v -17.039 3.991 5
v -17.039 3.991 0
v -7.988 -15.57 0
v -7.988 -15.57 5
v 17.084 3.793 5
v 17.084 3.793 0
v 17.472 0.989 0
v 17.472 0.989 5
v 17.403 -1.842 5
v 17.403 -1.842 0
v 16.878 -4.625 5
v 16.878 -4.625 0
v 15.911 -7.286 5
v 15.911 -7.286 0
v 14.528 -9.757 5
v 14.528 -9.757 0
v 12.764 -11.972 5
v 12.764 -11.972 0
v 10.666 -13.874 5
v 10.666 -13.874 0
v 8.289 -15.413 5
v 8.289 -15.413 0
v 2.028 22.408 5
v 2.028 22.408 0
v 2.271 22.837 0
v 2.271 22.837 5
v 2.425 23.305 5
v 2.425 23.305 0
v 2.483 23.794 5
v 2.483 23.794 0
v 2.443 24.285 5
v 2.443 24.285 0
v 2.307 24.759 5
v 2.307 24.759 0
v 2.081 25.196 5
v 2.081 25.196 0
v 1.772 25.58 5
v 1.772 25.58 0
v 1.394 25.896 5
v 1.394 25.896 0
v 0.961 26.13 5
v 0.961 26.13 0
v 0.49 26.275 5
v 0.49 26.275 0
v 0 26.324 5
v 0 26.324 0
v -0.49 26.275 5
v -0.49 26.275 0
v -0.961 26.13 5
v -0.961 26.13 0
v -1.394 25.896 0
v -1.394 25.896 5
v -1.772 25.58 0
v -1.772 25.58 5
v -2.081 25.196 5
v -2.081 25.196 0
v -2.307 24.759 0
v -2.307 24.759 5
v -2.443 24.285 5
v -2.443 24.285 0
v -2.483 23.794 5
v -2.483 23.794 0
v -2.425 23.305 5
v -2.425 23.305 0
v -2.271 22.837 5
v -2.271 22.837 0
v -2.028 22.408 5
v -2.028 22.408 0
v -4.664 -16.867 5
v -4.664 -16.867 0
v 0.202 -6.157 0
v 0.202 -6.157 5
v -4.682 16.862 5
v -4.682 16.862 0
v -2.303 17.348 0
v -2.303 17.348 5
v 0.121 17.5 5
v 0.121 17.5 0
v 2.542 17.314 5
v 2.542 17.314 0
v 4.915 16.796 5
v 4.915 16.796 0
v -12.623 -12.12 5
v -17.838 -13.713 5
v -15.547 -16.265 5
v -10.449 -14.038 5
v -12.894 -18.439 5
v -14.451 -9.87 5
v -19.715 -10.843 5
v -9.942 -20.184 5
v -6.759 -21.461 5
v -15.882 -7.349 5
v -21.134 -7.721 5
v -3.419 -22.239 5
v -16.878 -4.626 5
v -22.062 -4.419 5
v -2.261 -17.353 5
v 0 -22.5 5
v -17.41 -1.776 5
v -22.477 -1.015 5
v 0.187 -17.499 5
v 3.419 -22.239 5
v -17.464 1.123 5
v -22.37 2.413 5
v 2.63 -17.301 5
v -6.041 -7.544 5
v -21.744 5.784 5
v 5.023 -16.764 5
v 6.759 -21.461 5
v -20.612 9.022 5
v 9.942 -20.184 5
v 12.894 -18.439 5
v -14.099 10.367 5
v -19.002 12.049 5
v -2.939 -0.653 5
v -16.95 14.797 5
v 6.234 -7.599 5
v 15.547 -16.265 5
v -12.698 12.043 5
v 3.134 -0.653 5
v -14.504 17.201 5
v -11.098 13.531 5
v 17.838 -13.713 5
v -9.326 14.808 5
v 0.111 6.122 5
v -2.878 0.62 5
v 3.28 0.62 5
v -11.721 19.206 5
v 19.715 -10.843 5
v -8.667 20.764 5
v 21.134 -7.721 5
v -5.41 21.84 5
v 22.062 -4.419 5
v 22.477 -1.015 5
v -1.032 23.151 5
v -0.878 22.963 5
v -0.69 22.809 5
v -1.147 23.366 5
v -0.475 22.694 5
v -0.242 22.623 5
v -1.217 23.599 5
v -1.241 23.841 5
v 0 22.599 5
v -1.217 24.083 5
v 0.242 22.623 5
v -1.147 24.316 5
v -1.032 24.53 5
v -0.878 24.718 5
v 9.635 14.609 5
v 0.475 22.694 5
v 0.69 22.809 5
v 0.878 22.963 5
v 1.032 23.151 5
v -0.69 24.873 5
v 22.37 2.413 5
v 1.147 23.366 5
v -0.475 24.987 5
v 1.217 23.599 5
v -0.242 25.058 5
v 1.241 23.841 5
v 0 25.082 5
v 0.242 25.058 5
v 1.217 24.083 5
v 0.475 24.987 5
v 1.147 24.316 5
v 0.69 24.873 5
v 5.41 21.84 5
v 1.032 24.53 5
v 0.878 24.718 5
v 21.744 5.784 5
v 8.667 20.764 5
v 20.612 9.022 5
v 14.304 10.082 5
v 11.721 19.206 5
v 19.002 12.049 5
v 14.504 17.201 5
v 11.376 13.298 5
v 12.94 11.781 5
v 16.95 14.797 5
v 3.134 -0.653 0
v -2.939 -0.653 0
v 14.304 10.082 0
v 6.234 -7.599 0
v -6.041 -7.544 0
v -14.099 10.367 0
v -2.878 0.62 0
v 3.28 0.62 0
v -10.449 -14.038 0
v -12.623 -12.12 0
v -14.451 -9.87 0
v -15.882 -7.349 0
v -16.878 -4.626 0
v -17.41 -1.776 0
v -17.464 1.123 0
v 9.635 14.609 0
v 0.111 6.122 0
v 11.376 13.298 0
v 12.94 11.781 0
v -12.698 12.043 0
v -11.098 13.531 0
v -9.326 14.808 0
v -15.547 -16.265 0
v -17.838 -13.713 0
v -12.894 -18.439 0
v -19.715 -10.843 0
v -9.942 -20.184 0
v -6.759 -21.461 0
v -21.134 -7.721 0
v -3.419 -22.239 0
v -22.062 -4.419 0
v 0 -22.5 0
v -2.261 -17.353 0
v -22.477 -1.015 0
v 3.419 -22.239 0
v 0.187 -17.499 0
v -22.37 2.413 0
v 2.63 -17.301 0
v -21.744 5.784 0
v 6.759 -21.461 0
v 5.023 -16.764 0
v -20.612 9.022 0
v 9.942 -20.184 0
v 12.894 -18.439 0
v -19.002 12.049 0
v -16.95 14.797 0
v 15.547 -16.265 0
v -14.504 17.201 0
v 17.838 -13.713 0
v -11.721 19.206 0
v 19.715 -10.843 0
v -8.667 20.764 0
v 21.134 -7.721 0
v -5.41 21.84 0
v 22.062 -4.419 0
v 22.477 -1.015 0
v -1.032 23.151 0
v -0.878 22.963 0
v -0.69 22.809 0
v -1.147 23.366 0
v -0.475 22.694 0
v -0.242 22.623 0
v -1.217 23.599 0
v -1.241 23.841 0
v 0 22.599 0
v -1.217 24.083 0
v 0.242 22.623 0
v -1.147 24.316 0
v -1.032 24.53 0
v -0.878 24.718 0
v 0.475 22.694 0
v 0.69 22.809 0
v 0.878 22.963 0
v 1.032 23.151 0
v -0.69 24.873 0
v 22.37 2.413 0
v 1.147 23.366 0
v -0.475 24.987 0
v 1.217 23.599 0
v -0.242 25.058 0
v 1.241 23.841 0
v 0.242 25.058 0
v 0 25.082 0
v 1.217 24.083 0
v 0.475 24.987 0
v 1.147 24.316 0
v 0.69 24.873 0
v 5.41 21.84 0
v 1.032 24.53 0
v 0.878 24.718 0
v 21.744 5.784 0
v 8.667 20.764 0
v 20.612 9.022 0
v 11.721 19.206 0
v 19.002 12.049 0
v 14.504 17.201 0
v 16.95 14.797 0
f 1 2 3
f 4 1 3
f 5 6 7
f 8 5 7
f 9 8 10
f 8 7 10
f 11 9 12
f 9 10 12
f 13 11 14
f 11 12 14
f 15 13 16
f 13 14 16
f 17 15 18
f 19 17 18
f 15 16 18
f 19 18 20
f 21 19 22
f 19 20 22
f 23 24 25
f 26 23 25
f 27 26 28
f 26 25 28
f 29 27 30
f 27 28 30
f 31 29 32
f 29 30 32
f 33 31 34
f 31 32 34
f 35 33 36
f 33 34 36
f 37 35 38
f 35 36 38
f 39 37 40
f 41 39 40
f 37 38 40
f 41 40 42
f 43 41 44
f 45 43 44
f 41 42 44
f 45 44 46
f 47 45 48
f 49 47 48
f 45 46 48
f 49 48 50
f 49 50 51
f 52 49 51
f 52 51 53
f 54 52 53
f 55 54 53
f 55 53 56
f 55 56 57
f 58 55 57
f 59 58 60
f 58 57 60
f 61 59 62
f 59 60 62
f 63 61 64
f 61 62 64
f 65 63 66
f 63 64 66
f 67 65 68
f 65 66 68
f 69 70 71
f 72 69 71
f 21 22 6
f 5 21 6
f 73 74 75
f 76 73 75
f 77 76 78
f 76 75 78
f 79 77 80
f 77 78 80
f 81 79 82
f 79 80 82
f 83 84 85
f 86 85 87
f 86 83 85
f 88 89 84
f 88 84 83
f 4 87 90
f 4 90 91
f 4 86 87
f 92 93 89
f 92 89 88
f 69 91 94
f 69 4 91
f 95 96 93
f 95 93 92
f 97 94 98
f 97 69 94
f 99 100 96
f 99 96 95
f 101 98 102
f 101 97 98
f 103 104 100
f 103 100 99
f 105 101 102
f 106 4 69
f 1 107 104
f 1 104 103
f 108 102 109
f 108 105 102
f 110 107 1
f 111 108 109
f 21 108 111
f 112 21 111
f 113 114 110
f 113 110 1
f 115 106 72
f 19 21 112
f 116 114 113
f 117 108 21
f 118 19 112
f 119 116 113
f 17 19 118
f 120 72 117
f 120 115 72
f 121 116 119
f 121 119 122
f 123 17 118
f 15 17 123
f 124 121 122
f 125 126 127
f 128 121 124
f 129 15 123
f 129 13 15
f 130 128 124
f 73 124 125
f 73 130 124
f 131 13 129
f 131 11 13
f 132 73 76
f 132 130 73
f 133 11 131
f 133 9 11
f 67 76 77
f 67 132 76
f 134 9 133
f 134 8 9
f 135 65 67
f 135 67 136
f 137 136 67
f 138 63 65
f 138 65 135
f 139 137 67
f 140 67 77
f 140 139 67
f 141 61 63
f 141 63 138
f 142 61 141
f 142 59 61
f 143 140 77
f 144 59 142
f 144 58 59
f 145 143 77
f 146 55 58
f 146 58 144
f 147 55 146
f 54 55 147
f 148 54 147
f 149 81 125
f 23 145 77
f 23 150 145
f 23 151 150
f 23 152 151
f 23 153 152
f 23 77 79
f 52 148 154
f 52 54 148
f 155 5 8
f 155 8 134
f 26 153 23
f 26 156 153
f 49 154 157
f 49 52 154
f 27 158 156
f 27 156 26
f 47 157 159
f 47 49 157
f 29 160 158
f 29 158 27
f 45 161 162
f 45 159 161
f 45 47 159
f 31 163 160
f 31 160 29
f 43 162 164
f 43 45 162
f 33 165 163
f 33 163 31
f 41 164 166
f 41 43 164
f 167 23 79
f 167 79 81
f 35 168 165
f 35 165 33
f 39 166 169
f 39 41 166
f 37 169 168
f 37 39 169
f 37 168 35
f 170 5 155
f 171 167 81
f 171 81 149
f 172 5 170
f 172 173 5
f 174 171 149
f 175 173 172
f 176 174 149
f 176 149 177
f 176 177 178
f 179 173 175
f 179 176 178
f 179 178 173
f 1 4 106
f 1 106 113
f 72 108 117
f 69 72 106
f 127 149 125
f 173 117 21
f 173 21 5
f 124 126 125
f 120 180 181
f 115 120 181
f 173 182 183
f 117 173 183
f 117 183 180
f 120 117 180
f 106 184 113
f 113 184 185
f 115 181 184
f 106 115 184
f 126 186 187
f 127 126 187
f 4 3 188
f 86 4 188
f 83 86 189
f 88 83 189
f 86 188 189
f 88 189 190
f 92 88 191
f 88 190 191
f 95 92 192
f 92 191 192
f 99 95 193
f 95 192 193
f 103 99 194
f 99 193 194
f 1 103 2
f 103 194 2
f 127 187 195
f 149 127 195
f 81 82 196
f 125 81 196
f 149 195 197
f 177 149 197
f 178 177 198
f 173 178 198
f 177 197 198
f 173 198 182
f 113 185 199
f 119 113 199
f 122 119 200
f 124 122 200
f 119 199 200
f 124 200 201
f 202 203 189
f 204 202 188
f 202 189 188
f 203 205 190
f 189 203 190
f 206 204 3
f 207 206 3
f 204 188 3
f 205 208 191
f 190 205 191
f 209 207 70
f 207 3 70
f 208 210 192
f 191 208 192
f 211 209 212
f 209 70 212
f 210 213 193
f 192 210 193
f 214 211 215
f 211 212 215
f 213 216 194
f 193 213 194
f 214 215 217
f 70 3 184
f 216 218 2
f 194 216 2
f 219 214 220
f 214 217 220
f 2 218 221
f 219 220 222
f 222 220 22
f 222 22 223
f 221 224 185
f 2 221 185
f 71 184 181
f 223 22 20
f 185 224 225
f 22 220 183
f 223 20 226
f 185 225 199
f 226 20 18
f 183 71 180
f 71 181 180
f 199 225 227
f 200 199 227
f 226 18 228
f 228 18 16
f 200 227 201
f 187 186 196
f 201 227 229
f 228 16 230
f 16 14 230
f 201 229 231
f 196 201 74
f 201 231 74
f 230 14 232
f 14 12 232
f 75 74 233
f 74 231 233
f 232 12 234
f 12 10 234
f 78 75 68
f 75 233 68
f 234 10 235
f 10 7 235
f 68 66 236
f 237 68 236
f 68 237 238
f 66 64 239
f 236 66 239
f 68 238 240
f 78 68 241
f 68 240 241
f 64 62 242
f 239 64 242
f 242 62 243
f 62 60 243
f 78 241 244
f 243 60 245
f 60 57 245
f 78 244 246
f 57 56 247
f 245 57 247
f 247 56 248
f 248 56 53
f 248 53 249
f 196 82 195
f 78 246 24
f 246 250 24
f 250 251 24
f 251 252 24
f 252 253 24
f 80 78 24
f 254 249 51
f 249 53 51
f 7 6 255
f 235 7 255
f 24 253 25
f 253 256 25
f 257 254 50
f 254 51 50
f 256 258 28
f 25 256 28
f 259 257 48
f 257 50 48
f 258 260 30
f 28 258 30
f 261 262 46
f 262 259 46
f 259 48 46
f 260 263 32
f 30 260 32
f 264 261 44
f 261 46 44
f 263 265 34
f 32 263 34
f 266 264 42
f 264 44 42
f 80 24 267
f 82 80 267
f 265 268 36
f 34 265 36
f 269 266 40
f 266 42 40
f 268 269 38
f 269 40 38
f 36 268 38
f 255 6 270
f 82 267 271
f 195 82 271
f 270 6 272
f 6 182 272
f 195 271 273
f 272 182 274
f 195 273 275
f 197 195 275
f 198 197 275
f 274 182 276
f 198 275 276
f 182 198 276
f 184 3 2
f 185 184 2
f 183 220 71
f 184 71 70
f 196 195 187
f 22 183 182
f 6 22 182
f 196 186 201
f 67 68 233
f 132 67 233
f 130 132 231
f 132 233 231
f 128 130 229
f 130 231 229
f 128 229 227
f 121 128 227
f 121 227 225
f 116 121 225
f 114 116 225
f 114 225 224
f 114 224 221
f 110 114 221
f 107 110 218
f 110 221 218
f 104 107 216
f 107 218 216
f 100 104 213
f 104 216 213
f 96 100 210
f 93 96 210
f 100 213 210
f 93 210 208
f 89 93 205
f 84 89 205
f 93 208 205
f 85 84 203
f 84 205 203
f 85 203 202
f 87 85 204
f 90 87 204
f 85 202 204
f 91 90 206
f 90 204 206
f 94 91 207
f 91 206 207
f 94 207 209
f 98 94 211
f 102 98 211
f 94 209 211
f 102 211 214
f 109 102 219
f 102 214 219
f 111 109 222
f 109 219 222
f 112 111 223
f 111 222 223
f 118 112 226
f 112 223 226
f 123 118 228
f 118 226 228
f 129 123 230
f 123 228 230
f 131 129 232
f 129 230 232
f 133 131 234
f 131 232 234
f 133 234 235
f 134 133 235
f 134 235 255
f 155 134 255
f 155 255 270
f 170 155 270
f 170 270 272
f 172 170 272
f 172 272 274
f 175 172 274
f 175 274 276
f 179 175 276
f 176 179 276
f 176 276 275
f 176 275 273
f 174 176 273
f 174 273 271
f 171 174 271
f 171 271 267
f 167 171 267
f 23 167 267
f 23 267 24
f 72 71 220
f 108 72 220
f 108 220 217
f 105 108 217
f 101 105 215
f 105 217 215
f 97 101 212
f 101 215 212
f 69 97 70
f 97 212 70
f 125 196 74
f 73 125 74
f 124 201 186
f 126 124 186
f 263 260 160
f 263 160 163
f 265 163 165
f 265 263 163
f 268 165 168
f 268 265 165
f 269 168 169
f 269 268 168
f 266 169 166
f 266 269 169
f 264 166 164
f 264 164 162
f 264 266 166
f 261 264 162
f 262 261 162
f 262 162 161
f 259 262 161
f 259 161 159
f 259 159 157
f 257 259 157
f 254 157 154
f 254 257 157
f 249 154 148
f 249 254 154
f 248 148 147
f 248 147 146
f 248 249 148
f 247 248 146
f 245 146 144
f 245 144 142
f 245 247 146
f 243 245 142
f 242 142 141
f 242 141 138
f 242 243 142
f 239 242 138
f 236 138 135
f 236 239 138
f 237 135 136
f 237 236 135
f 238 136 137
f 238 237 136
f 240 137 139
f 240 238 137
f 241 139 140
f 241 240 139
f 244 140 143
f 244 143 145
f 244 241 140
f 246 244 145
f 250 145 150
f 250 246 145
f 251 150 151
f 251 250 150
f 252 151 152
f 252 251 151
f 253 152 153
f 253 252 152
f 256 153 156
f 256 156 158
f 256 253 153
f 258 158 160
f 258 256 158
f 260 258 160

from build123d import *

# Parameters (mm, degrees)
F0_R     = 1.241195
F1_DEPTH = 5


with BuildPart() as f1:
    # F0 (on Top) → F1 (new body)
    with BuildSketch(Plane.XY):
        with BuildLine():
            ThreePointArc((2.028342, 22.408387), (0, 26.323733), (-2.028342, 22.408387))
            ThreePointArc((-2.028342, 22.408387), (0, -22.5), (2.028342, 22.408387))
        make_face()
        with BuildLine():
            ThreePointArc((-7.988275, -15.570403), (-15.882311, -7.348618), (-17.038951, 3.990506))
            Line((-17.038951, 3.990506), (-7.988275, -15.570403))
        make_face(mode=Mode.SUBTRACT)
        with BuildLine():
            ThreePointArc((5.022585, -16.76376), (0.186737, -17.499004), (-4.6637, -16.867125))
            Line((-4.6637, -16.867125), (0.201713, -6.156514))
            Line((0.201713, -6.156514), (5.022585, -16.76376))
        make_face(mode=Mode.SUBTRACT)
        with BuildLine():
            Line((8.288617, -15.412619), (17.083899, 3.793469))
            ThreePointArc((17.083899, 3.793469), (15.91099, -7.286317), (8.288617, -15.412619))
        make_face(mode=Mode.SUBTRACT)
        with BuildLine():
            Line((3.280106, 0.620191), (9.634679, 14.609003))
            ThreePointArc((9.634679, 14.609003), (12.181654, 12.564128), (14.304266, 10.081566))
            Line((14.304266, 10.081566), (6.233971, -7.599009))
            Line((6.233971, -7.599009), (3.134064, -0.652507))
            Line((3.134064, -0.652507), (-2.938647, -0.652507))
            Line((-2.938647, -0.652507), (-6.040588, -7.544222))
            Line((-6.040588, -7.544222), (-14.098893, 10.366833))
            ThreePointArc((-14.098893, 10.366833), (-11.921222, 12.811498), (-9.326312, 14.807765))
            Line((-9.326312, 14.807765), (-2.878222, 0.620191))
            Line((-2.878222, 0.620191), (3.280106, 0.620191))
        make_face(mode=Mode.SUBTRACT)
        with BuildLine():
            ThreePointArc((-4.6819, 16.862082), (0.121059, 17.499581), (4.914738, 16.795694))
            Line((4.914738, 16.795694), (0.110725, 6.122414))
            Line((0.110725, 6.122414), (-4.6819, 16.862082))
        make_face(mode=Mode.SUBTRACT)
        with Locations((0, 23.84067)):
            Circle(F0_R, mode=Mode.SUBTRACT)
    extrude(amount=F1_DEPTH)


solid = f1.part
